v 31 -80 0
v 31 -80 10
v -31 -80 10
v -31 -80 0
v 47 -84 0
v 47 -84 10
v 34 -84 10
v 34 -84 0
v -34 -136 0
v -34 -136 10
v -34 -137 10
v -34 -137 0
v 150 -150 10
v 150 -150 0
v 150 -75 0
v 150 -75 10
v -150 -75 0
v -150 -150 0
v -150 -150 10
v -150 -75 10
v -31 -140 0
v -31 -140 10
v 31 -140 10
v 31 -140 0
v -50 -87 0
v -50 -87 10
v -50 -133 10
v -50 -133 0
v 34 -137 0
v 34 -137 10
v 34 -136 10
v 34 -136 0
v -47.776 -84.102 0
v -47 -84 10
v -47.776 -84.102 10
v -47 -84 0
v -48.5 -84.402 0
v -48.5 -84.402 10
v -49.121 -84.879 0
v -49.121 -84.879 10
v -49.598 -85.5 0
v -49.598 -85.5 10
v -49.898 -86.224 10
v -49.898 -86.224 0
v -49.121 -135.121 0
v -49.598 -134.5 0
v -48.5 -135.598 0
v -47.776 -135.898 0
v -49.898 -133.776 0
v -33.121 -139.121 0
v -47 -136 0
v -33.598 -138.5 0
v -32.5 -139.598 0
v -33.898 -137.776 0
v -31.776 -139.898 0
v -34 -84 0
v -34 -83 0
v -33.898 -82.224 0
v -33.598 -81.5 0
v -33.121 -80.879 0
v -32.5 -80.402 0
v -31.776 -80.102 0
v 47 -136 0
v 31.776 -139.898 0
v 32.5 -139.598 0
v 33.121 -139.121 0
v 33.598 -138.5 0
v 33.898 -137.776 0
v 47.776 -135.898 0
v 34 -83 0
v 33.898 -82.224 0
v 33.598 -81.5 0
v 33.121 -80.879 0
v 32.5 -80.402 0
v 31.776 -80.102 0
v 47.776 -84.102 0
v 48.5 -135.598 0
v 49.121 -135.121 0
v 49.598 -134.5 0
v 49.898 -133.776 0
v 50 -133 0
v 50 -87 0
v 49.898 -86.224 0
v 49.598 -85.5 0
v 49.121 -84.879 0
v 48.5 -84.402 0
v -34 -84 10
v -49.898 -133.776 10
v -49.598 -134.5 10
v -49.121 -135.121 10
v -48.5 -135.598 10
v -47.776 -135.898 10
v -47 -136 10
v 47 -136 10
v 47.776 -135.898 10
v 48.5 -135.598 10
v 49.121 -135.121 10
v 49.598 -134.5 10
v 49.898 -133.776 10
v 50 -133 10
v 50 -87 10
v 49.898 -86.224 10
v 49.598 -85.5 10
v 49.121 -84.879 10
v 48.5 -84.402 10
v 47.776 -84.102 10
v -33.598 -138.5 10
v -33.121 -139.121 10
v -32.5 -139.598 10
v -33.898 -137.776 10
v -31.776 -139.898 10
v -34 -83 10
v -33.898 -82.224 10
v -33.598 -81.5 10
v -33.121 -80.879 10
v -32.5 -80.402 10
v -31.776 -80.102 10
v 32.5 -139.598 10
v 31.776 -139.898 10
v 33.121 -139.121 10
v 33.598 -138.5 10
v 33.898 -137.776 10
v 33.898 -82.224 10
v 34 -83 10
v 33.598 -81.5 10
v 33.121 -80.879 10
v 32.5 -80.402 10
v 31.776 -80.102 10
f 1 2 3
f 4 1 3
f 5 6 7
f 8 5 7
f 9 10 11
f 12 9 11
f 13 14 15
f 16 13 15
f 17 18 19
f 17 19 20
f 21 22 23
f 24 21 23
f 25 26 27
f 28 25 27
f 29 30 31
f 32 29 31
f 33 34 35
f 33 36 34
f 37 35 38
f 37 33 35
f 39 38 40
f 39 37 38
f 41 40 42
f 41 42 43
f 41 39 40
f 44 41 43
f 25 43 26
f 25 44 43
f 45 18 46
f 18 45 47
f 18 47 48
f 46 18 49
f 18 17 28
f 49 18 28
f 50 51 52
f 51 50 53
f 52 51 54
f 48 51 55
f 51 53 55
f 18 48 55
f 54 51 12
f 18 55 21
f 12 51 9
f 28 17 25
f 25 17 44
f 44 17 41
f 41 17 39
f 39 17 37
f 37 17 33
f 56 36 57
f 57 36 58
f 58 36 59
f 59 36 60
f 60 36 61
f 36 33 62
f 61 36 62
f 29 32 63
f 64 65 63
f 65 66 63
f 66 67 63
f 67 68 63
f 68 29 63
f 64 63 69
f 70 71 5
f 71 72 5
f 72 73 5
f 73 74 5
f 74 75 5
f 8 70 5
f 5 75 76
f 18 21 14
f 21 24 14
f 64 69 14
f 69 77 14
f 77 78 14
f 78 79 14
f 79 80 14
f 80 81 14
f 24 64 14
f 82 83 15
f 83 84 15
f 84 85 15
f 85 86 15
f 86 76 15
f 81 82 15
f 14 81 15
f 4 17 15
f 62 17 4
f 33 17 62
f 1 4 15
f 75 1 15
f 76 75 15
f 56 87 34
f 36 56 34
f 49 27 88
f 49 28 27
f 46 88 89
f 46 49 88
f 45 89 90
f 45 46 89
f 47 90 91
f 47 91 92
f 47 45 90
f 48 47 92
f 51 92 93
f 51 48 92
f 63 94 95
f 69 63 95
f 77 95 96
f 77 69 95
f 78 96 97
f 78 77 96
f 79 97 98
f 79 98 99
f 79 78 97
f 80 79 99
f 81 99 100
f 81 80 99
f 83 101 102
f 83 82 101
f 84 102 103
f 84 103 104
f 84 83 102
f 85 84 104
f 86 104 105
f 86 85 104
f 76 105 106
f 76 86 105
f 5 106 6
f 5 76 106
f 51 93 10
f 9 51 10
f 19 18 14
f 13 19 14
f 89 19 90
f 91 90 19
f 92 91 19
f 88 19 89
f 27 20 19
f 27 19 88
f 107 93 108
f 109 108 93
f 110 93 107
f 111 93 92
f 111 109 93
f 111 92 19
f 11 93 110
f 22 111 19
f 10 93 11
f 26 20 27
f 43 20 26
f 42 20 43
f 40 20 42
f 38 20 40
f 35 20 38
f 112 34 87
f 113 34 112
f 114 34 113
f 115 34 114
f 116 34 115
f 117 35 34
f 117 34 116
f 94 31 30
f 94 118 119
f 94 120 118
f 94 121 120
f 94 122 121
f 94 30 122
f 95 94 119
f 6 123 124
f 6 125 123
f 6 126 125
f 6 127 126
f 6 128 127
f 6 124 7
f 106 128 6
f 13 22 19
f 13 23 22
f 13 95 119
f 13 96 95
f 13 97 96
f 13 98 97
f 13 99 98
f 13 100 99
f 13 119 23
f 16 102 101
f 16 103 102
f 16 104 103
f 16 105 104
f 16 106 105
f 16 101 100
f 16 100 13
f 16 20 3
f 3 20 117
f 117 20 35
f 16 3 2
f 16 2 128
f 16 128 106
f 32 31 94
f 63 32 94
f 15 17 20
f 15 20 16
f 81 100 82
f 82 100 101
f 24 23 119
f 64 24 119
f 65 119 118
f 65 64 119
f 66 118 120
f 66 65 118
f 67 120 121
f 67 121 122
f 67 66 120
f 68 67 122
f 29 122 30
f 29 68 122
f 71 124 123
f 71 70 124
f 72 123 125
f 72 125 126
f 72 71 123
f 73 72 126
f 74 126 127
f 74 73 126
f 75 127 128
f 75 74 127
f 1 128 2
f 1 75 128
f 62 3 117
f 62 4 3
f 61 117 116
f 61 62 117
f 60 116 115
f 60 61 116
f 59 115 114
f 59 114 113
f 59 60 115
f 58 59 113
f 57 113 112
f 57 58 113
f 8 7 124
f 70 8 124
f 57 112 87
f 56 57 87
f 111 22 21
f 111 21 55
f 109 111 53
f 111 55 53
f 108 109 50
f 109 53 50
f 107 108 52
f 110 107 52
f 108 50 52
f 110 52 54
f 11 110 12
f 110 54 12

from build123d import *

# Parameters (mm, degrees)
SKIZZE1_W                       = 300
SKIZZE1_H                       = 75
LINEAR_AUSTRAGEN1_DEPTH         = 10
SCHNITT_LINEAR_AUSTRAGEN1_DEPTH = 10
VERRUNDUNG1_R                   = 3


with BuildPart() as part:
    # Skizze1 → Linear austragen1 (new body)
    with BuildSketch(Plane.XY):
        with Locations((0, -112.5)):
            Rectangle(SKIZZE1_W, SKIZZE1_H)
    extrude(amount=LINEAR_AUSTRAGEN1_DEPTH)

    # Skizze2 → Schnitt-Linear austragen1 (cut)
    with BuildSketch(Plane.XY.offset(10)):
        Polygon((-34, -140), (34, -140), (34, -136), (50, -136), (50, -84), (34, -84), (34, -80), (-34, -80), (-34, -84), (-50, -84), (-50, -136), (-34, -136), align=None)
    extrude(amount=-SCHNITT_LINEAR_AUSTRAGEN1_DEPTH, mode=Mode.SUBTRACT)

    # Verrundung1
    verrundung1_edges = [part.edges().sort_by_distance(p)[0] for p in [
        (-34, -140, 5),
        (-50, -136, 5),
        (-50, -84, 5),
        (-34, -80, 5),
        (34, -80, 5),
        (50, -84, 5),
        (50, -136, 5),
        (34, -140, 5),
    ]]
    fillet(verrundung1_edges, radius=VERRUNDUNG1_R)


solid = part.part
